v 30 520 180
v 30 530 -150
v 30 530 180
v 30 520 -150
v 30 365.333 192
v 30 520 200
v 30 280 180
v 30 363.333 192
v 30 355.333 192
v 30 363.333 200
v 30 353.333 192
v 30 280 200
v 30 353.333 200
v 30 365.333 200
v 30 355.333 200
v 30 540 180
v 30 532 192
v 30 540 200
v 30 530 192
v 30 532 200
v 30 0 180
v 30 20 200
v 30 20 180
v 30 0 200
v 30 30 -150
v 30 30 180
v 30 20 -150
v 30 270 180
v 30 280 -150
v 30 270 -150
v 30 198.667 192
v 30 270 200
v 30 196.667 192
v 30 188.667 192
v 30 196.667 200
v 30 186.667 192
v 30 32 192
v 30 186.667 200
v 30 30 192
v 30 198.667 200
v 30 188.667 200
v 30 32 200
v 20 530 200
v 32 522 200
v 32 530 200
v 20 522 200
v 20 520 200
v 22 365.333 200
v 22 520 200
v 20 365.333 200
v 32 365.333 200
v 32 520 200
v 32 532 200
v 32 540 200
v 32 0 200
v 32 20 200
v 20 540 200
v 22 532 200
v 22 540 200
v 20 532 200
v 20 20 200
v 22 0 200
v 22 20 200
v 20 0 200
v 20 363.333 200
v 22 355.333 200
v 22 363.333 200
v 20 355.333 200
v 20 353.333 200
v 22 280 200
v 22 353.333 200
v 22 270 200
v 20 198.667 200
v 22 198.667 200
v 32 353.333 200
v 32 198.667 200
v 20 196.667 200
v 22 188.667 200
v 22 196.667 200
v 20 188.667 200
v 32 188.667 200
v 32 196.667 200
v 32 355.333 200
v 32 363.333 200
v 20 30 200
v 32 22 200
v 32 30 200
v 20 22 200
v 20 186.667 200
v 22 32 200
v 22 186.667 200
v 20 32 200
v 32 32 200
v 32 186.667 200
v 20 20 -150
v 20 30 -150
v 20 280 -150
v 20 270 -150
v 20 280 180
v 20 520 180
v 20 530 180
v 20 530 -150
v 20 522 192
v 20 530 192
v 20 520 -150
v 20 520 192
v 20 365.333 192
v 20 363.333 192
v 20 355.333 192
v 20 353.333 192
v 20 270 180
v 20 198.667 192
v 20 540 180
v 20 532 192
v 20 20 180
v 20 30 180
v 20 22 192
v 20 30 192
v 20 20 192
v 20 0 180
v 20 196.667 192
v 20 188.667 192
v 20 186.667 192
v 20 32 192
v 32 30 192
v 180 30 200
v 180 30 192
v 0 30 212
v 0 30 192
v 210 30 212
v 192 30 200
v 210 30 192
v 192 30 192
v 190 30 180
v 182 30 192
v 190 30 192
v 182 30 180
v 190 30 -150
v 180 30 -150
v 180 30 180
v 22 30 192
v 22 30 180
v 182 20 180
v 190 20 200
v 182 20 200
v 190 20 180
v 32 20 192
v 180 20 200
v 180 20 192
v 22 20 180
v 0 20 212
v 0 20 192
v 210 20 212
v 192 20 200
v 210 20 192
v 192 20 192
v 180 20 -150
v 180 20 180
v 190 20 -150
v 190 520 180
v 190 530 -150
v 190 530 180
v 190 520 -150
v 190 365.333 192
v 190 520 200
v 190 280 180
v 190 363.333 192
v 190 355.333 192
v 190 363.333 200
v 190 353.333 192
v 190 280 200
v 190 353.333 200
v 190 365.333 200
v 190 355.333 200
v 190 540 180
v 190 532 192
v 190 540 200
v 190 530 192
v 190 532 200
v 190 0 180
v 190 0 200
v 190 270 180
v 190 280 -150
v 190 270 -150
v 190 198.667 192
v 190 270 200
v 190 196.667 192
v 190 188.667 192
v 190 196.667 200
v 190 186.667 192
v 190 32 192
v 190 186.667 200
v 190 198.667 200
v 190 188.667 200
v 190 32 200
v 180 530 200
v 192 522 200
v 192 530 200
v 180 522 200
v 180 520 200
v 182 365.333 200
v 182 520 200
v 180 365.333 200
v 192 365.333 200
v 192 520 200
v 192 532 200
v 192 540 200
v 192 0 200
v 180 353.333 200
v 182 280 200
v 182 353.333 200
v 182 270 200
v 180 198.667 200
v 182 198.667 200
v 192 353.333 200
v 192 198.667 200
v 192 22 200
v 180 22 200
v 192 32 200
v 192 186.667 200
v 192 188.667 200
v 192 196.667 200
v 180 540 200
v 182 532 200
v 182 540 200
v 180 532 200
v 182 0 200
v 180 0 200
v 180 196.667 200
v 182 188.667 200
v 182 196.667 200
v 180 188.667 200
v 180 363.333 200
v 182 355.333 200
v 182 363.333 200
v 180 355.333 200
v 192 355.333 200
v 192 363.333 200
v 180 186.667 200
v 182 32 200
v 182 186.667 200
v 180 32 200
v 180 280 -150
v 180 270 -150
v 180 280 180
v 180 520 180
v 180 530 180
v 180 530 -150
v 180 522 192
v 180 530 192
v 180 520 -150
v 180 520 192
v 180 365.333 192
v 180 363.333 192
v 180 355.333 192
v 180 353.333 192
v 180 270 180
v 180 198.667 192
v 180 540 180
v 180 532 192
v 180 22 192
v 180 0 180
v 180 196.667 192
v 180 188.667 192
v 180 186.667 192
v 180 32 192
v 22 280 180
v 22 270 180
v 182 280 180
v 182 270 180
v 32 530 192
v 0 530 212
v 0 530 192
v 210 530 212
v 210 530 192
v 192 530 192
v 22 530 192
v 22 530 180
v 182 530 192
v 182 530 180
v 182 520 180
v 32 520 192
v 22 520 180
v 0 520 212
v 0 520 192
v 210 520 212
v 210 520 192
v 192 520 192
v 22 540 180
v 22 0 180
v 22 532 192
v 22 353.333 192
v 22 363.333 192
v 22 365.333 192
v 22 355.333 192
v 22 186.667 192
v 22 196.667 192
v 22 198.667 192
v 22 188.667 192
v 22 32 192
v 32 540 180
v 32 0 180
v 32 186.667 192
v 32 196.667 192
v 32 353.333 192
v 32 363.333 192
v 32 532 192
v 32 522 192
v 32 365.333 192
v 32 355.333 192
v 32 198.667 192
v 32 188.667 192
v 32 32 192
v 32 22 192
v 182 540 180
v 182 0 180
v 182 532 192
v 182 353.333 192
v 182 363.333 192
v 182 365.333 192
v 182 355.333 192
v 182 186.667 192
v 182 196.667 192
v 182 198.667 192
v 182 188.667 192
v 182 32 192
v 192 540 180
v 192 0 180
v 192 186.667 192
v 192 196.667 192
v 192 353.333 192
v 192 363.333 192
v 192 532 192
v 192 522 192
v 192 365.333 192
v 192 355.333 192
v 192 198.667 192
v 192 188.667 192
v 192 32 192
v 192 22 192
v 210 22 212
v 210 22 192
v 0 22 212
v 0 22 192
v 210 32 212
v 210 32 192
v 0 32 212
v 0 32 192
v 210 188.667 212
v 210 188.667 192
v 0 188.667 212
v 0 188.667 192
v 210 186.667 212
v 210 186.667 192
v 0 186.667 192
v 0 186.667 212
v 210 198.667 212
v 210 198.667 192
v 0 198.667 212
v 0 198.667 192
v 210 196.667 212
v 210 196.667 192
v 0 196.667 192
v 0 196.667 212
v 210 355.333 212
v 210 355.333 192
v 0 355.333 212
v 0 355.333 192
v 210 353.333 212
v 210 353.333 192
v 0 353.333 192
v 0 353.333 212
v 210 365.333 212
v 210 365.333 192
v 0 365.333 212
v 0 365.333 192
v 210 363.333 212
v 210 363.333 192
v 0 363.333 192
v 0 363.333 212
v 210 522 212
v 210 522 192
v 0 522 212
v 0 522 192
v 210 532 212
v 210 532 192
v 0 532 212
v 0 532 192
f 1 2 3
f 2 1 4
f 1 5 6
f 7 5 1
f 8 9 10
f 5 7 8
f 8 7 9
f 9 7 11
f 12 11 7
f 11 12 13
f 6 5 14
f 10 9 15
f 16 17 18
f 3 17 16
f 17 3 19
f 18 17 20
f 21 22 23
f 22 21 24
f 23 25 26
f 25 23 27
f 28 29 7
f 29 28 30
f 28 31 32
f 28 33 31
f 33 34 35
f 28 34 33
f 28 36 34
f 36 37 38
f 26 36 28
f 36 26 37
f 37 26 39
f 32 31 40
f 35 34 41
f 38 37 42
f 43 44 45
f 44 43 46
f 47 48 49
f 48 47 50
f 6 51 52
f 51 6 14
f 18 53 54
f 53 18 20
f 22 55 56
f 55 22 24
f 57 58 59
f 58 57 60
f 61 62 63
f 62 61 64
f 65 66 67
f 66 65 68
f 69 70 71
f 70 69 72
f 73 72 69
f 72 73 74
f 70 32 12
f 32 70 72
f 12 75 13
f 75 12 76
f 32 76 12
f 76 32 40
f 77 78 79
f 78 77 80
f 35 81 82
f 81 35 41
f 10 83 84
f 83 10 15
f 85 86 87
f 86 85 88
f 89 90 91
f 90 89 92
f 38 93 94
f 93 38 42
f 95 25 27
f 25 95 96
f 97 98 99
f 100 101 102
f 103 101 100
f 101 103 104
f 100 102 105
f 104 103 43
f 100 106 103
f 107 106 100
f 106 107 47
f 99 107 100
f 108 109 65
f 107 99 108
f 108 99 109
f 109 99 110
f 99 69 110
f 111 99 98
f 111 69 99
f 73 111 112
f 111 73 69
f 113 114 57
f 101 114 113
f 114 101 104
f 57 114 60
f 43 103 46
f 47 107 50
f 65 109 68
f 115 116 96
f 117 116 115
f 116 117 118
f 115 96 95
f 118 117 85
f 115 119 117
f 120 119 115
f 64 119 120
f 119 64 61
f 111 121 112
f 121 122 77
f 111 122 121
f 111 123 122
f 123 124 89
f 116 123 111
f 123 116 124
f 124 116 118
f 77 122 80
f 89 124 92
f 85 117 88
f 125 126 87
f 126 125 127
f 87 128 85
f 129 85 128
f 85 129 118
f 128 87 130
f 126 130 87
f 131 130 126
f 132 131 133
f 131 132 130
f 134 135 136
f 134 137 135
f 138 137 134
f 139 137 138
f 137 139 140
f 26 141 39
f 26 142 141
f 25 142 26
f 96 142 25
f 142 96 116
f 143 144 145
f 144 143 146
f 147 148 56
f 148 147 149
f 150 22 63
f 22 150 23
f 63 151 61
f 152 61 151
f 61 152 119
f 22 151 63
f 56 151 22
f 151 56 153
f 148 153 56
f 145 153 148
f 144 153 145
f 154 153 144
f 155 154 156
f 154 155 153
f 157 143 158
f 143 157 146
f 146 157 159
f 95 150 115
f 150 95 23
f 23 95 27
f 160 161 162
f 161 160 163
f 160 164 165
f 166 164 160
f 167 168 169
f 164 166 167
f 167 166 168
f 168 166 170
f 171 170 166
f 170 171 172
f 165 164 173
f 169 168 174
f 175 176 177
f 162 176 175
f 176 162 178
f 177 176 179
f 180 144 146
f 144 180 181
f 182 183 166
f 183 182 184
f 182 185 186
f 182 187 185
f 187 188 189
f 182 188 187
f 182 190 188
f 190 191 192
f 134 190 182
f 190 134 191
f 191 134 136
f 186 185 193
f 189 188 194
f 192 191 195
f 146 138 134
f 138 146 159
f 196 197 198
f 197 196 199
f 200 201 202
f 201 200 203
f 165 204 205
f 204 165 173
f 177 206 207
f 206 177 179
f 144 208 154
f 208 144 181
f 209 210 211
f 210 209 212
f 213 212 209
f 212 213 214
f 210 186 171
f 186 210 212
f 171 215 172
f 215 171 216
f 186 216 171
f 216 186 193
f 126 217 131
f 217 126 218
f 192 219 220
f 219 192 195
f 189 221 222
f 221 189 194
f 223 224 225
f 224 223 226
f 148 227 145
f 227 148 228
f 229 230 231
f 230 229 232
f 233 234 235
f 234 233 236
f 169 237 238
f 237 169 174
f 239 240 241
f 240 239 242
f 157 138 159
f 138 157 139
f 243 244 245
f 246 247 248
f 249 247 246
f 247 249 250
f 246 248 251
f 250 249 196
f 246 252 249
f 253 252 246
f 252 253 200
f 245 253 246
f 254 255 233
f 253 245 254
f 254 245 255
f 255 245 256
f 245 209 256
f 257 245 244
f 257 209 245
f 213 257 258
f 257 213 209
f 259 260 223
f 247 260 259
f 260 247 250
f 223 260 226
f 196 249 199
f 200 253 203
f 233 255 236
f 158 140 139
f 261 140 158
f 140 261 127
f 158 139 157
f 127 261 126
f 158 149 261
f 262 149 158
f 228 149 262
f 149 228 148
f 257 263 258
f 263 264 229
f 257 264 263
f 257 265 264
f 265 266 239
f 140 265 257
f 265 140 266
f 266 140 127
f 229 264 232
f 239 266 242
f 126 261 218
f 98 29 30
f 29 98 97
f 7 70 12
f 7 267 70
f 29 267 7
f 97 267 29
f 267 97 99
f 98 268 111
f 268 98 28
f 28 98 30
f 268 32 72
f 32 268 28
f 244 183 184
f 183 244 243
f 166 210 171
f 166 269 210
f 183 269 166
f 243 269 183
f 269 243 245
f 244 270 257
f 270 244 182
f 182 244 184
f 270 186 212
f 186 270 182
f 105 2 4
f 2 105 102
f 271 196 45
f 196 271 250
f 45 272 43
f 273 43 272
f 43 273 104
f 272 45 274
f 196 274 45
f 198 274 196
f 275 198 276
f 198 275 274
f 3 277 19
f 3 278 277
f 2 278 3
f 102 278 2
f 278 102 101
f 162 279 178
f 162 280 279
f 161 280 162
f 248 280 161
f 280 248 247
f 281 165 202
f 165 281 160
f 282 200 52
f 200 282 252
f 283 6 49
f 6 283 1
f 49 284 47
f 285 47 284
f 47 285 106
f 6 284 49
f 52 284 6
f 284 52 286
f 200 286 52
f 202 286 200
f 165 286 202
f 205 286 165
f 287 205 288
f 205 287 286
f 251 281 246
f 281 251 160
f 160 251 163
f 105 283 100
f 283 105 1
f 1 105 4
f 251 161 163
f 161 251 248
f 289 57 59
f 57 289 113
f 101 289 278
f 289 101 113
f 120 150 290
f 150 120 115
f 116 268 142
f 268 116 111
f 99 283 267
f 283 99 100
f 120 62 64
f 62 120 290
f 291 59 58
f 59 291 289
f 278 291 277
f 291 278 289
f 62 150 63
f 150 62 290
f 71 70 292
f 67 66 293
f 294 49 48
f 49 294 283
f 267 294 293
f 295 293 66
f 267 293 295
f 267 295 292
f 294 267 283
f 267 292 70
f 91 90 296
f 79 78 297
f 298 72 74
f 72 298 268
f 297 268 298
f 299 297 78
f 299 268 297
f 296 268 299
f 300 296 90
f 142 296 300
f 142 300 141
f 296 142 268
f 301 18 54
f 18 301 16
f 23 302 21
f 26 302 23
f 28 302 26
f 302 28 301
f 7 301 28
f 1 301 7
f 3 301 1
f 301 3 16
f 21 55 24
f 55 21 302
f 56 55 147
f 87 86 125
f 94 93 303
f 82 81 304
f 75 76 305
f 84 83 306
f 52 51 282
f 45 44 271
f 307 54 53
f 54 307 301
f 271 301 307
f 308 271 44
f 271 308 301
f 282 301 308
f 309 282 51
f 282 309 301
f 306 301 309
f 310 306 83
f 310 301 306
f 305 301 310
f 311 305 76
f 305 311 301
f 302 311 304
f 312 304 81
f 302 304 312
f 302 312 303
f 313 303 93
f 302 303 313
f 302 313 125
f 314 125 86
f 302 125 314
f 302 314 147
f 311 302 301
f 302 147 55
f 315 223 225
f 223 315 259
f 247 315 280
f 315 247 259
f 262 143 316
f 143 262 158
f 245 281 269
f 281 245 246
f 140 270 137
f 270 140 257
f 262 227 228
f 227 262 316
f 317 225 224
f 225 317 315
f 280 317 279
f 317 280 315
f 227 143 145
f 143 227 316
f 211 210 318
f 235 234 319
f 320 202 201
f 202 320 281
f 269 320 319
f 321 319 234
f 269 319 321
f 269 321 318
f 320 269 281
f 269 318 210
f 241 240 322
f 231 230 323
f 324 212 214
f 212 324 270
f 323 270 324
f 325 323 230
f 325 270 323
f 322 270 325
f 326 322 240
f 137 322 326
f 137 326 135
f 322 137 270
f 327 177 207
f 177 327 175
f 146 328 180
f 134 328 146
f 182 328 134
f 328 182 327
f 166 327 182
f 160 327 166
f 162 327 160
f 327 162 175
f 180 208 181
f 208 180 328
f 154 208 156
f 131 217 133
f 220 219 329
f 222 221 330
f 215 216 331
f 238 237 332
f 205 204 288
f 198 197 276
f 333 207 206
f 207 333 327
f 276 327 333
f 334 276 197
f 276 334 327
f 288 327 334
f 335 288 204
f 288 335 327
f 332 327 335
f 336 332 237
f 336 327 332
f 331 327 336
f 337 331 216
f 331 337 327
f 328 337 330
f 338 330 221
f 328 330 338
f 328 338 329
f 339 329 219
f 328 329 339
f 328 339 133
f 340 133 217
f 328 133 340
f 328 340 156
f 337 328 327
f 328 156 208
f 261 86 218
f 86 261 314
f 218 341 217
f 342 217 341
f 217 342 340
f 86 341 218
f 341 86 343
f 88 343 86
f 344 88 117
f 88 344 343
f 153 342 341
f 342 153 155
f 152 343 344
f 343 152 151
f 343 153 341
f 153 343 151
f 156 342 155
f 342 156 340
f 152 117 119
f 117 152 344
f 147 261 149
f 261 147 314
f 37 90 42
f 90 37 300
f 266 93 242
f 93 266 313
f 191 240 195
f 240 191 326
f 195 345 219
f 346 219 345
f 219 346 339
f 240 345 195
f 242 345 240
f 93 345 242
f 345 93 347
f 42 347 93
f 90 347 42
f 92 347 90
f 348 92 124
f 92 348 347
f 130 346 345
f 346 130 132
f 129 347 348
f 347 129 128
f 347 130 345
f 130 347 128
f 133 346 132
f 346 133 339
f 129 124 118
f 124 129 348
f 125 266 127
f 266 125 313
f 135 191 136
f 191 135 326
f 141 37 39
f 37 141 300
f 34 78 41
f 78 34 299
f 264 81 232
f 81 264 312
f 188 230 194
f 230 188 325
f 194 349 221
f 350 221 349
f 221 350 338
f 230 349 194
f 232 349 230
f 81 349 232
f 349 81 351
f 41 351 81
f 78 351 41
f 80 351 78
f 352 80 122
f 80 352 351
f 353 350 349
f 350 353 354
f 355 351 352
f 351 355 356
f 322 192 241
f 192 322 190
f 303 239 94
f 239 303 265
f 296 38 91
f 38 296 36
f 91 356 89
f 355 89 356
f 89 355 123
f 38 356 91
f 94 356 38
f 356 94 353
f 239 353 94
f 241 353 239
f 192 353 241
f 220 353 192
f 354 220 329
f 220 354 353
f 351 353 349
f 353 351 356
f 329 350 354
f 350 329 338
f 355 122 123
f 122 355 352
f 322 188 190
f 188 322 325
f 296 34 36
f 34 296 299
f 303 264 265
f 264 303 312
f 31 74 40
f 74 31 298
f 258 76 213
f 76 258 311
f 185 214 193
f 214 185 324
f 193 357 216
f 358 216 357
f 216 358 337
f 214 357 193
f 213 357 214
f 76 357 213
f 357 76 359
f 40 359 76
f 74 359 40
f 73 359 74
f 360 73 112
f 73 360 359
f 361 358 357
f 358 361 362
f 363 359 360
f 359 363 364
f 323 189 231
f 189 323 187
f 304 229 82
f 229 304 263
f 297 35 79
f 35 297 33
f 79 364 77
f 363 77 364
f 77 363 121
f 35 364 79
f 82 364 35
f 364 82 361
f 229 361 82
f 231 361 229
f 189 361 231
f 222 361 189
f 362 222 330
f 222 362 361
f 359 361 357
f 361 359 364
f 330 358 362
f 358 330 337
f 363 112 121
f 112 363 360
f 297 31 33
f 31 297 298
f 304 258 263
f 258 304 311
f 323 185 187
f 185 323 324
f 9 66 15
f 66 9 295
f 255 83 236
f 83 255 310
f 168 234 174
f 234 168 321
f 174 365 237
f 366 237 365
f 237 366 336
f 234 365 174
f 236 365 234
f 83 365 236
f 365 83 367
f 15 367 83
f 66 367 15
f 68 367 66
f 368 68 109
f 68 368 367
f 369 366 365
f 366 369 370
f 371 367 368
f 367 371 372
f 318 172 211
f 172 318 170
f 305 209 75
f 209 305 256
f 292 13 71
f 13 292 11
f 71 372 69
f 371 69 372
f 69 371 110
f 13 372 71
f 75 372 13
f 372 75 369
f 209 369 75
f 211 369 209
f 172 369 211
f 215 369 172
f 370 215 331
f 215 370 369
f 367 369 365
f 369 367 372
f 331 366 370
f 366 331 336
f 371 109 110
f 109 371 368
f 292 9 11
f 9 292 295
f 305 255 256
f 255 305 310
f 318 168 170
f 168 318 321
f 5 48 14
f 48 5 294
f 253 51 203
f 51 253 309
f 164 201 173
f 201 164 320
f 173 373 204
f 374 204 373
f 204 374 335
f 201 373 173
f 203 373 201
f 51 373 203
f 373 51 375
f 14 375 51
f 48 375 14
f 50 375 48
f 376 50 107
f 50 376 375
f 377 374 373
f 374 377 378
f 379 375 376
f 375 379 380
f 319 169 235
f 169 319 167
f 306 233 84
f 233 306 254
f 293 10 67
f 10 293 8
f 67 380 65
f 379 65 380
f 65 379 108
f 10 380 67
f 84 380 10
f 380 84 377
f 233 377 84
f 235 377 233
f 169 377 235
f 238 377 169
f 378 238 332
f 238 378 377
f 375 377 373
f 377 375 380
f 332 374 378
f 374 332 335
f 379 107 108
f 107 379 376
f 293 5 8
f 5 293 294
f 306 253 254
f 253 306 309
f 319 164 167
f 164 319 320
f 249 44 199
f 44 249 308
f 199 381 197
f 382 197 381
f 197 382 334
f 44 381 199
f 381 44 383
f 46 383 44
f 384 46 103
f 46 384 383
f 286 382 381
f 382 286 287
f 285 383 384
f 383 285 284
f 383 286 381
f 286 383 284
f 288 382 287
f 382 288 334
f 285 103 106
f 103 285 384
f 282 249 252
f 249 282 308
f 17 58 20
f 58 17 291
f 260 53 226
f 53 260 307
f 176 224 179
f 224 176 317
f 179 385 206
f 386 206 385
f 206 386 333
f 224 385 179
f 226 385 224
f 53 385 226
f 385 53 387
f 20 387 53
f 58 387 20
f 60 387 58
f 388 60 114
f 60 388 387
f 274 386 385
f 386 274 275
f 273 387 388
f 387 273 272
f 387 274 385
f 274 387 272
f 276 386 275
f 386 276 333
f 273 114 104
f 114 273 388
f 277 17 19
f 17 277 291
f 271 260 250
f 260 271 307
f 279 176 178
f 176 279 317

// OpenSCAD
terrasAfstand    = 20;
schuttingAfstand = 20;

//Balk Informatie
balkBreedte =   10;
balkDikte   =   10;
balkHoogte  =  350;
balkDiepte  = -150;

//Constructie informatie
schommelBreedte = 150;
totalelengte    = 500;

//Lengte Plank Informatie
lengtePlankLengte = 500 + terrasAfstand * 2 ;
lengtePlankHoogte =  20;
lengtePlankDikte  =   2;

//Dwars Plank Informatie
dwarsPlankLengte = schommelBreedte + schuttingAfstand * 2 + balkBreedte *2;
dwarsPlankHoogte     = 20;
dwarsPlankDikte      =  2; 
dwarsPlankVerzinking = -8; 

//NOTITIE: ACHTERSTE PALEN STAAN TE VER, KOMT DOOR TOTALE LENGTE MOET ZIJN TOTALE LENGTE - TERAASAFSTAND

//Eerste 2 Palen
color("DarkGoldenrod")
translate([schuttingAfstand,terrasAfstand,balkDiepte]) cube([balkBreedte, balkDikte, balkHoogte]);
color("DarkGoldenrod")
translate([schuttingAfstand + schommelBreedte + balkDikte,terrasAfstand,balkDiepte]) cube([balkBreedte, balkDikte, balkHoogte]);

//Middelste Palen
color("DarkGoldenrod")
translate([schuttingAfstand,terrasAfstand + totalelengte/2,balkDiepte]) cube([balkBreedte, balkDikte, balkHoogte]);
color("DarkGoldenrod")
translate([schuttingAfstand + schommelBreedte + balkDikte,terrasAfstand + totalelengte/2,balkDiepte]) cube([balkBreedte, balkDikte, balkHoogte]);

//Achterste Palen
color("DarkGoldenrod")
translate([schuttingAfstand,terrasAfstand + totalelengte,balkDiepte]) cube([balkBreedte, balkDikte, balkHoogte]);
color("DarkGoldenrod")
translate([schuttingAfstand + schommelBreedte + balkDikte,terrasAfstand + totalelengte,balkDiepte]) cube([balkBreedte, balkDikte, balkHoogte]);

//Lengte Latten
translate ([schuttingAfstand,0,balkHoogte + balkDiepte])
rotate([90,180,180]) color("Brown") cube([lengtePlankDikte, lengtePlankHoogte, lengtePlankLengte]);
translate ([schuttingAfstand + balkDikte,0,balkHoogte + balkDiepte])
rotate([90,180,180]) color("Brown") cube([lengtePlankDikte, lengtePlankHoogte, lengtePlankLengte]);

translate ([schuttingAfstand + schommelBreedte + balkDikte,0,balkHoogte + balkDiepte])
rotate([90,180,180]) color("Brown") cube([lengtePlankDikte, lengtePlankHoogte, lengtePlankLengte]);
translate ([schuttingAfstand + balkDikte + schommelBreedte + balkDikte,0,balkHoogte + balkDiepte])
rotate([90,180,180]) color("Brown") cube([lengtePlankDikte, lengtePlankHoogte, lengtePlankLengte]);

//DwarsLatten
//translate ([schuttingAfstand + schommelBreedte + balkDikte,0,balkHoogte + balkDiepte])
color("BurlyWood") rotate([90,0,90]) 
translate([terrasAfstand,balkHoogte + balkDiepte + dwarsPlankVerzinking,0])cube([dwarsPlankDikte, dwarsPlankHoogte, dwarsPlankLengte]);
color("BurlyWood") rotate([90,0,90]) 
translate([terrasAfstand + balkDikte,balkHoogte + balkDiepte + dwarsPlankVerzinking,0])cube([dwarsPlankDikte, dwarsPlankHoogte, dwarsPlankLengte]);

color("BurlyWood") rotate([90,0,90]) 
translate([terrasAfstand + totalelengte/3,balkHoogte + balkDiepte + dwarsPlankVerzinking,0])cube([dwarsPlankDikte, dwarsPlankHoogte, dwarsPlankLengte]);
color("BurlyWood") rotate([90,0,90]) 
translate([terrasAfstand + balkDikte + totalelengte/3,balkHoogte + balkDiepte + dwarsPlankVerzinking,0])cube([dwarsPlankDikte, dwarsPlankHoogte, dwarsPlankLengte]);


color("BurlyWood") rotate([90,0,90]) 
translate([terrasAfstand + totalelengte/3*2,balkHoogte + balkDiepte + dwarsPlankVerzinking,0])cube([dwarsPlankDikte, dwarsPlankHoogte, dwarsPlankLengte]);
color("BurlyWood") rotate([90,0,90]) 
translate([terrasAfstand + balkDikte + totalelengte/3*2,balkHoogte + balkDiepte + dwarsPlankVerzinking,0])cube([dwarsPlankDikte, dwarsPlankHoogte, dwarsPlankLengte]);


color("BurlyWood") rotate([90,0,90]) 
translate([terrasAfstand + totalelengte,balkHoogte + balkDiepte + dwarsPlankVerzinking,0])cube([dwarsPlankDikte, dwarsPlankHoogte, dwarsPlankLengte]);
color("BurlyWood") rotate([90,0,90]) 
translate([terrasAfstand + balkDikte + totalelengte,balkHoogte + balkDiepte + dwarsPlankVerzinking,0])cube([dwarsPlankDikte, dwarsPlankHoogte, dwarsPlankLengte]);
